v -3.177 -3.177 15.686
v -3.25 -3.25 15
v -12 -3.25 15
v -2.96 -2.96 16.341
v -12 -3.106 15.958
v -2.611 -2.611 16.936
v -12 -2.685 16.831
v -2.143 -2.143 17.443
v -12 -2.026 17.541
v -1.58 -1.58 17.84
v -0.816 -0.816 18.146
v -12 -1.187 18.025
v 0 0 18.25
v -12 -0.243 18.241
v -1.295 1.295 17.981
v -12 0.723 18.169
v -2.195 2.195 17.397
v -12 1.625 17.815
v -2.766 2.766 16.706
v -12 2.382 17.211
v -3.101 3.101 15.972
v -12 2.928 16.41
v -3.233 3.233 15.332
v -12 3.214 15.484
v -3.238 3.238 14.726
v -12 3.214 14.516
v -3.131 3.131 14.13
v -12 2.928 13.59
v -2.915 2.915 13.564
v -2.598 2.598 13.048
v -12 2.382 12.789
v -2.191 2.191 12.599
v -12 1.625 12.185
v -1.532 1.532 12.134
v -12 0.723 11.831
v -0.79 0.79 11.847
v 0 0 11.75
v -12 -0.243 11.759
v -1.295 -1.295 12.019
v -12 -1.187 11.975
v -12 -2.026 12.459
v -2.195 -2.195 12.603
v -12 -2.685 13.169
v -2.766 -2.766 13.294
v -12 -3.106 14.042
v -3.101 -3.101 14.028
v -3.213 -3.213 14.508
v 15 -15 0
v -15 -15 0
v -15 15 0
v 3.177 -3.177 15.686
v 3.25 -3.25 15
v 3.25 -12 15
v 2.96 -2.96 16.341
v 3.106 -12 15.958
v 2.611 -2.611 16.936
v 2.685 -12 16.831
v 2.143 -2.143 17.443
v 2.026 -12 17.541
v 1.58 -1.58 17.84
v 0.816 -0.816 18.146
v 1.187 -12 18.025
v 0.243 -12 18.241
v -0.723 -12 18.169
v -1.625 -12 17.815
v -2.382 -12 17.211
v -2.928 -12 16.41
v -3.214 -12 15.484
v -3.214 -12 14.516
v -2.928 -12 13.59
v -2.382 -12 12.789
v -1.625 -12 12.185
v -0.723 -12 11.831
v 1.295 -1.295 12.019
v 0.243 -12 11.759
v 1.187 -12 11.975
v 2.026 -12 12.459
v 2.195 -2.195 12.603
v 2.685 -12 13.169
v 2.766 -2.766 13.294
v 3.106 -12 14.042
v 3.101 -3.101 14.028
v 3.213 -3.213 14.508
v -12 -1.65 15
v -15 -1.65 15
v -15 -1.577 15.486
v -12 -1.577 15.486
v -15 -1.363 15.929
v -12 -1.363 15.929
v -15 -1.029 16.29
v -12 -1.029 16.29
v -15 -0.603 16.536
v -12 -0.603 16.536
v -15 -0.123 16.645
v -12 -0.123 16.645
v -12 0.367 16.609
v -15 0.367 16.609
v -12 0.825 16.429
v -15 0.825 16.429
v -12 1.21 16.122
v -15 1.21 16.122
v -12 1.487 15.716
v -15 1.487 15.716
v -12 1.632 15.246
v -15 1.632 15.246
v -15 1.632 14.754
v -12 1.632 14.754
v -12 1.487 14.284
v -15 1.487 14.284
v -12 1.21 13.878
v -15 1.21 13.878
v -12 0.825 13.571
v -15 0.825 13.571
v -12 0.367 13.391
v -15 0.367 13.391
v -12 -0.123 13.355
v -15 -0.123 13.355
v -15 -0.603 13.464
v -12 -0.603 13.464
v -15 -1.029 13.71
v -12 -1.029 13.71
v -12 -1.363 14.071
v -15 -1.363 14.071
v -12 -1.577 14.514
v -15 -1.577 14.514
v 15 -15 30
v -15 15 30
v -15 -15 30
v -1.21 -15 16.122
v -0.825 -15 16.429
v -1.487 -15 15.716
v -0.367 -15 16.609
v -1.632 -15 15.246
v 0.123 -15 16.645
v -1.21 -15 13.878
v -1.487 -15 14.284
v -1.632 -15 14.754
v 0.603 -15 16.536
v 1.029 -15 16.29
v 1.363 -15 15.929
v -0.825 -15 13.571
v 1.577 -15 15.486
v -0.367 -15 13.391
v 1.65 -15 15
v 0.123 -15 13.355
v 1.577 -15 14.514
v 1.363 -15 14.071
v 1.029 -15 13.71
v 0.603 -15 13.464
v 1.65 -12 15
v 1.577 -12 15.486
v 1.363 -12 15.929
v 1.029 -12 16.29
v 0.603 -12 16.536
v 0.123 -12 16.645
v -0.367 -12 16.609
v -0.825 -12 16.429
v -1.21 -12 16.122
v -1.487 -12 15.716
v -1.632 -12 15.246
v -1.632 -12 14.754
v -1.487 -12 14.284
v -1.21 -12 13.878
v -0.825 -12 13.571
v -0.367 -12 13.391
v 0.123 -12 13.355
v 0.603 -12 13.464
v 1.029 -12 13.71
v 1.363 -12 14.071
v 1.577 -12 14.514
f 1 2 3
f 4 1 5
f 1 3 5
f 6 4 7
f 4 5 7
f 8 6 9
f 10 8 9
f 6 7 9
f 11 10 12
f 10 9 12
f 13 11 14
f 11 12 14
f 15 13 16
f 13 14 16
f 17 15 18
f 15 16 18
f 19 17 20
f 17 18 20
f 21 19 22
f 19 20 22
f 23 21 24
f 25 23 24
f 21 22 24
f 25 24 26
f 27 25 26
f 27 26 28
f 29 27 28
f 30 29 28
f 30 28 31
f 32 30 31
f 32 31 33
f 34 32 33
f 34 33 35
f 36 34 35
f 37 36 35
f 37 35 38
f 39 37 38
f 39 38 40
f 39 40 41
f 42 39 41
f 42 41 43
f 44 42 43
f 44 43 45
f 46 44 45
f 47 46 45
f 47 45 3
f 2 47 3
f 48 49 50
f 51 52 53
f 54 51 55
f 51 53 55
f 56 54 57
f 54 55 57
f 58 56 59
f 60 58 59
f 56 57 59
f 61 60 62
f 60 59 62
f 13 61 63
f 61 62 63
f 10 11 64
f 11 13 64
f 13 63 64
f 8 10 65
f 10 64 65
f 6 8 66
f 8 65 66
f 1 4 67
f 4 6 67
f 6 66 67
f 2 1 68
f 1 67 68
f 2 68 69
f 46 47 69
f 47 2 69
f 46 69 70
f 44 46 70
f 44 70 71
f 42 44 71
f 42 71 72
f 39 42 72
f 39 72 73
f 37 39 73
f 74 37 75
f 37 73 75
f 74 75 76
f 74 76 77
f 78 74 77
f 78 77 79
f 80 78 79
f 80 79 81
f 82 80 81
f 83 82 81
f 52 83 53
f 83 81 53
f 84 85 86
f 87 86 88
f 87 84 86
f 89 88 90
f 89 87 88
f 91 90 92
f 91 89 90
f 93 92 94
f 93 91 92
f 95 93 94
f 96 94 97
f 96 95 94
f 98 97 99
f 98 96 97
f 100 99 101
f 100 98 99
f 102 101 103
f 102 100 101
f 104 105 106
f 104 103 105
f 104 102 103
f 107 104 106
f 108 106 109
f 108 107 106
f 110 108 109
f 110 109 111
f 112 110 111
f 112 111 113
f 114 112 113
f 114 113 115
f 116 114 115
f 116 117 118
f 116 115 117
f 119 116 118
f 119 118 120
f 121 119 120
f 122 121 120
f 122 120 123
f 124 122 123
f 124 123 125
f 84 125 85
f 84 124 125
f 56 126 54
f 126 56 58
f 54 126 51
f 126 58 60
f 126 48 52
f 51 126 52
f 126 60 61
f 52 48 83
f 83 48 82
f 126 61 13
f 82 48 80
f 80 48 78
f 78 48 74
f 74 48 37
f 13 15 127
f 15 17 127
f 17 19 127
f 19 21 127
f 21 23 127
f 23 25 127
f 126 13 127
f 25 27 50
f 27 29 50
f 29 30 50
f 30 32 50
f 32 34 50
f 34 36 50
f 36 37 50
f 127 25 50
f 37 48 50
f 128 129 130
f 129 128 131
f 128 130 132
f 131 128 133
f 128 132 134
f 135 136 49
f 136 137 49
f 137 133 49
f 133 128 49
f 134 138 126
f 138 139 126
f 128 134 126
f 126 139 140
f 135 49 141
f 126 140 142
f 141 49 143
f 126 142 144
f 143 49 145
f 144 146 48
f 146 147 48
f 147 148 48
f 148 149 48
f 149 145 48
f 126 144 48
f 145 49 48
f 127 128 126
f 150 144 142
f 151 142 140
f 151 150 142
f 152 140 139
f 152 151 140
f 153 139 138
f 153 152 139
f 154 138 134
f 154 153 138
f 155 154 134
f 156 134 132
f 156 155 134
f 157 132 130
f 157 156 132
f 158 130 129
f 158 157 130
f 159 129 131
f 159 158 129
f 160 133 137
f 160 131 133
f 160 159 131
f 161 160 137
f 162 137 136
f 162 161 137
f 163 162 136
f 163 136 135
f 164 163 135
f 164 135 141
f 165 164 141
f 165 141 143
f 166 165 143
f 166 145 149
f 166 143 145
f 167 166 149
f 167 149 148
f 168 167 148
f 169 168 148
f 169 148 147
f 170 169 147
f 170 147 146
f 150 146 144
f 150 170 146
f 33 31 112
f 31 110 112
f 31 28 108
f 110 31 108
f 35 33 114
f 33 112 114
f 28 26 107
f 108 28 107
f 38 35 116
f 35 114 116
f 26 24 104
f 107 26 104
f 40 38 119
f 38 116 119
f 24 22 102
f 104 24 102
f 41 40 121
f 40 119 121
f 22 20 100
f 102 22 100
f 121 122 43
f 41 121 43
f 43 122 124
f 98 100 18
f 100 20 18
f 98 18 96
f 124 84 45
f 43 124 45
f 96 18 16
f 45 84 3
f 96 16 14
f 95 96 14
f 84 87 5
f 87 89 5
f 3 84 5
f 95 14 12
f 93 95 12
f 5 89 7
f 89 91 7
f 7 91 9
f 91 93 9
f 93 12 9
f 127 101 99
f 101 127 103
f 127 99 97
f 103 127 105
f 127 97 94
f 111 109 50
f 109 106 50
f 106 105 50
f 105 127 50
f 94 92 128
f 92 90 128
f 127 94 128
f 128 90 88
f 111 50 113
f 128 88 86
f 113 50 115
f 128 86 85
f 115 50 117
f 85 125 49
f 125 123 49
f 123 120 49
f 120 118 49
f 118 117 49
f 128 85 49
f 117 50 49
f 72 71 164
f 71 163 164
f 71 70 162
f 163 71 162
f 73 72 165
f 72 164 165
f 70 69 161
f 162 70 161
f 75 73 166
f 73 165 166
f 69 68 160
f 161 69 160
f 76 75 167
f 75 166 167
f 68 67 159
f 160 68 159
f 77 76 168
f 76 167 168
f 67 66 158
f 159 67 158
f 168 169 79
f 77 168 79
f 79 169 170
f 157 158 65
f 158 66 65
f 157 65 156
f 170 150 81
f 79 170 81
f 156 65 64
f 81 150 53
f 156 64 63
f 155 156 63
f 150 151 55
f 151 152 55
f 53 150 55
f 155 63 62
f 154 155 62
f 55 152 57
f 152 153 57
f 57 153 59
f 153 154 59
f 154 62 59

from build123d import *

# Parameters (mm, degrees)
F2_DEPTH  = 30
F4_R      = 3.25
F5_DEPTH  = 27.001
F6_R      = 1.65
F7_DEPTH  = 3.001
F9_R      = 3.25
F10_DEPTH = 27.001
F11_R     = 1.65
F12_DEPTH = 25


with BuildPart() as f2:
    # F1 (on Top) → F2 (new body)
    with BuildSketch(Plane.XY):
        Polygon((-15, -15), (15, -15), (-15, 15), align=None)
    extrude(amount=F2_DEPTH)

    # F4 (on offset) → F5 (cut, through all)
    with BuildSketch(Plane(origin=(-12, 0, 0), x_dir=(0, -1, 0), z_dir=(-1, 0, 0))):
        with Locations((0, 15)):
            Circle(F4_R)
    extrude(amount=-F5_DEPTH, mode=Mode.SUBTRACT)

    # F6 (on offset) → F7 (cut, through all)
    with BuildSketch(Plane(origin=(-12, 0, 0), x_dir=(0, -1, 0), z_dir=(-1, 0, 0))):
        with Locations((0, 15)):
            Circle(F6_R)
    extrude(amount=F7_DEPTH, mode=Mode.SUBTRACT)

    # F9 (on offset) → F10 (cut, through all)
    with BuildSketch(Plane.XZ.offset(12)):
        with Locations((0, 15)):
            Circle(F9_R)
    extrude(amount=-F10_DEPTH, mode=Mode.SUBTRACT)

    # F11 (on offset) → F12 (cut)
    with BuildSketch(Plane.XZ.offset(12)):
        with Locations((0, 15)):
            Circle(F11_R)
    extrude(amount=F12_DEPTH, mode=Mode.SUBTRACT)


solid = f2.part
